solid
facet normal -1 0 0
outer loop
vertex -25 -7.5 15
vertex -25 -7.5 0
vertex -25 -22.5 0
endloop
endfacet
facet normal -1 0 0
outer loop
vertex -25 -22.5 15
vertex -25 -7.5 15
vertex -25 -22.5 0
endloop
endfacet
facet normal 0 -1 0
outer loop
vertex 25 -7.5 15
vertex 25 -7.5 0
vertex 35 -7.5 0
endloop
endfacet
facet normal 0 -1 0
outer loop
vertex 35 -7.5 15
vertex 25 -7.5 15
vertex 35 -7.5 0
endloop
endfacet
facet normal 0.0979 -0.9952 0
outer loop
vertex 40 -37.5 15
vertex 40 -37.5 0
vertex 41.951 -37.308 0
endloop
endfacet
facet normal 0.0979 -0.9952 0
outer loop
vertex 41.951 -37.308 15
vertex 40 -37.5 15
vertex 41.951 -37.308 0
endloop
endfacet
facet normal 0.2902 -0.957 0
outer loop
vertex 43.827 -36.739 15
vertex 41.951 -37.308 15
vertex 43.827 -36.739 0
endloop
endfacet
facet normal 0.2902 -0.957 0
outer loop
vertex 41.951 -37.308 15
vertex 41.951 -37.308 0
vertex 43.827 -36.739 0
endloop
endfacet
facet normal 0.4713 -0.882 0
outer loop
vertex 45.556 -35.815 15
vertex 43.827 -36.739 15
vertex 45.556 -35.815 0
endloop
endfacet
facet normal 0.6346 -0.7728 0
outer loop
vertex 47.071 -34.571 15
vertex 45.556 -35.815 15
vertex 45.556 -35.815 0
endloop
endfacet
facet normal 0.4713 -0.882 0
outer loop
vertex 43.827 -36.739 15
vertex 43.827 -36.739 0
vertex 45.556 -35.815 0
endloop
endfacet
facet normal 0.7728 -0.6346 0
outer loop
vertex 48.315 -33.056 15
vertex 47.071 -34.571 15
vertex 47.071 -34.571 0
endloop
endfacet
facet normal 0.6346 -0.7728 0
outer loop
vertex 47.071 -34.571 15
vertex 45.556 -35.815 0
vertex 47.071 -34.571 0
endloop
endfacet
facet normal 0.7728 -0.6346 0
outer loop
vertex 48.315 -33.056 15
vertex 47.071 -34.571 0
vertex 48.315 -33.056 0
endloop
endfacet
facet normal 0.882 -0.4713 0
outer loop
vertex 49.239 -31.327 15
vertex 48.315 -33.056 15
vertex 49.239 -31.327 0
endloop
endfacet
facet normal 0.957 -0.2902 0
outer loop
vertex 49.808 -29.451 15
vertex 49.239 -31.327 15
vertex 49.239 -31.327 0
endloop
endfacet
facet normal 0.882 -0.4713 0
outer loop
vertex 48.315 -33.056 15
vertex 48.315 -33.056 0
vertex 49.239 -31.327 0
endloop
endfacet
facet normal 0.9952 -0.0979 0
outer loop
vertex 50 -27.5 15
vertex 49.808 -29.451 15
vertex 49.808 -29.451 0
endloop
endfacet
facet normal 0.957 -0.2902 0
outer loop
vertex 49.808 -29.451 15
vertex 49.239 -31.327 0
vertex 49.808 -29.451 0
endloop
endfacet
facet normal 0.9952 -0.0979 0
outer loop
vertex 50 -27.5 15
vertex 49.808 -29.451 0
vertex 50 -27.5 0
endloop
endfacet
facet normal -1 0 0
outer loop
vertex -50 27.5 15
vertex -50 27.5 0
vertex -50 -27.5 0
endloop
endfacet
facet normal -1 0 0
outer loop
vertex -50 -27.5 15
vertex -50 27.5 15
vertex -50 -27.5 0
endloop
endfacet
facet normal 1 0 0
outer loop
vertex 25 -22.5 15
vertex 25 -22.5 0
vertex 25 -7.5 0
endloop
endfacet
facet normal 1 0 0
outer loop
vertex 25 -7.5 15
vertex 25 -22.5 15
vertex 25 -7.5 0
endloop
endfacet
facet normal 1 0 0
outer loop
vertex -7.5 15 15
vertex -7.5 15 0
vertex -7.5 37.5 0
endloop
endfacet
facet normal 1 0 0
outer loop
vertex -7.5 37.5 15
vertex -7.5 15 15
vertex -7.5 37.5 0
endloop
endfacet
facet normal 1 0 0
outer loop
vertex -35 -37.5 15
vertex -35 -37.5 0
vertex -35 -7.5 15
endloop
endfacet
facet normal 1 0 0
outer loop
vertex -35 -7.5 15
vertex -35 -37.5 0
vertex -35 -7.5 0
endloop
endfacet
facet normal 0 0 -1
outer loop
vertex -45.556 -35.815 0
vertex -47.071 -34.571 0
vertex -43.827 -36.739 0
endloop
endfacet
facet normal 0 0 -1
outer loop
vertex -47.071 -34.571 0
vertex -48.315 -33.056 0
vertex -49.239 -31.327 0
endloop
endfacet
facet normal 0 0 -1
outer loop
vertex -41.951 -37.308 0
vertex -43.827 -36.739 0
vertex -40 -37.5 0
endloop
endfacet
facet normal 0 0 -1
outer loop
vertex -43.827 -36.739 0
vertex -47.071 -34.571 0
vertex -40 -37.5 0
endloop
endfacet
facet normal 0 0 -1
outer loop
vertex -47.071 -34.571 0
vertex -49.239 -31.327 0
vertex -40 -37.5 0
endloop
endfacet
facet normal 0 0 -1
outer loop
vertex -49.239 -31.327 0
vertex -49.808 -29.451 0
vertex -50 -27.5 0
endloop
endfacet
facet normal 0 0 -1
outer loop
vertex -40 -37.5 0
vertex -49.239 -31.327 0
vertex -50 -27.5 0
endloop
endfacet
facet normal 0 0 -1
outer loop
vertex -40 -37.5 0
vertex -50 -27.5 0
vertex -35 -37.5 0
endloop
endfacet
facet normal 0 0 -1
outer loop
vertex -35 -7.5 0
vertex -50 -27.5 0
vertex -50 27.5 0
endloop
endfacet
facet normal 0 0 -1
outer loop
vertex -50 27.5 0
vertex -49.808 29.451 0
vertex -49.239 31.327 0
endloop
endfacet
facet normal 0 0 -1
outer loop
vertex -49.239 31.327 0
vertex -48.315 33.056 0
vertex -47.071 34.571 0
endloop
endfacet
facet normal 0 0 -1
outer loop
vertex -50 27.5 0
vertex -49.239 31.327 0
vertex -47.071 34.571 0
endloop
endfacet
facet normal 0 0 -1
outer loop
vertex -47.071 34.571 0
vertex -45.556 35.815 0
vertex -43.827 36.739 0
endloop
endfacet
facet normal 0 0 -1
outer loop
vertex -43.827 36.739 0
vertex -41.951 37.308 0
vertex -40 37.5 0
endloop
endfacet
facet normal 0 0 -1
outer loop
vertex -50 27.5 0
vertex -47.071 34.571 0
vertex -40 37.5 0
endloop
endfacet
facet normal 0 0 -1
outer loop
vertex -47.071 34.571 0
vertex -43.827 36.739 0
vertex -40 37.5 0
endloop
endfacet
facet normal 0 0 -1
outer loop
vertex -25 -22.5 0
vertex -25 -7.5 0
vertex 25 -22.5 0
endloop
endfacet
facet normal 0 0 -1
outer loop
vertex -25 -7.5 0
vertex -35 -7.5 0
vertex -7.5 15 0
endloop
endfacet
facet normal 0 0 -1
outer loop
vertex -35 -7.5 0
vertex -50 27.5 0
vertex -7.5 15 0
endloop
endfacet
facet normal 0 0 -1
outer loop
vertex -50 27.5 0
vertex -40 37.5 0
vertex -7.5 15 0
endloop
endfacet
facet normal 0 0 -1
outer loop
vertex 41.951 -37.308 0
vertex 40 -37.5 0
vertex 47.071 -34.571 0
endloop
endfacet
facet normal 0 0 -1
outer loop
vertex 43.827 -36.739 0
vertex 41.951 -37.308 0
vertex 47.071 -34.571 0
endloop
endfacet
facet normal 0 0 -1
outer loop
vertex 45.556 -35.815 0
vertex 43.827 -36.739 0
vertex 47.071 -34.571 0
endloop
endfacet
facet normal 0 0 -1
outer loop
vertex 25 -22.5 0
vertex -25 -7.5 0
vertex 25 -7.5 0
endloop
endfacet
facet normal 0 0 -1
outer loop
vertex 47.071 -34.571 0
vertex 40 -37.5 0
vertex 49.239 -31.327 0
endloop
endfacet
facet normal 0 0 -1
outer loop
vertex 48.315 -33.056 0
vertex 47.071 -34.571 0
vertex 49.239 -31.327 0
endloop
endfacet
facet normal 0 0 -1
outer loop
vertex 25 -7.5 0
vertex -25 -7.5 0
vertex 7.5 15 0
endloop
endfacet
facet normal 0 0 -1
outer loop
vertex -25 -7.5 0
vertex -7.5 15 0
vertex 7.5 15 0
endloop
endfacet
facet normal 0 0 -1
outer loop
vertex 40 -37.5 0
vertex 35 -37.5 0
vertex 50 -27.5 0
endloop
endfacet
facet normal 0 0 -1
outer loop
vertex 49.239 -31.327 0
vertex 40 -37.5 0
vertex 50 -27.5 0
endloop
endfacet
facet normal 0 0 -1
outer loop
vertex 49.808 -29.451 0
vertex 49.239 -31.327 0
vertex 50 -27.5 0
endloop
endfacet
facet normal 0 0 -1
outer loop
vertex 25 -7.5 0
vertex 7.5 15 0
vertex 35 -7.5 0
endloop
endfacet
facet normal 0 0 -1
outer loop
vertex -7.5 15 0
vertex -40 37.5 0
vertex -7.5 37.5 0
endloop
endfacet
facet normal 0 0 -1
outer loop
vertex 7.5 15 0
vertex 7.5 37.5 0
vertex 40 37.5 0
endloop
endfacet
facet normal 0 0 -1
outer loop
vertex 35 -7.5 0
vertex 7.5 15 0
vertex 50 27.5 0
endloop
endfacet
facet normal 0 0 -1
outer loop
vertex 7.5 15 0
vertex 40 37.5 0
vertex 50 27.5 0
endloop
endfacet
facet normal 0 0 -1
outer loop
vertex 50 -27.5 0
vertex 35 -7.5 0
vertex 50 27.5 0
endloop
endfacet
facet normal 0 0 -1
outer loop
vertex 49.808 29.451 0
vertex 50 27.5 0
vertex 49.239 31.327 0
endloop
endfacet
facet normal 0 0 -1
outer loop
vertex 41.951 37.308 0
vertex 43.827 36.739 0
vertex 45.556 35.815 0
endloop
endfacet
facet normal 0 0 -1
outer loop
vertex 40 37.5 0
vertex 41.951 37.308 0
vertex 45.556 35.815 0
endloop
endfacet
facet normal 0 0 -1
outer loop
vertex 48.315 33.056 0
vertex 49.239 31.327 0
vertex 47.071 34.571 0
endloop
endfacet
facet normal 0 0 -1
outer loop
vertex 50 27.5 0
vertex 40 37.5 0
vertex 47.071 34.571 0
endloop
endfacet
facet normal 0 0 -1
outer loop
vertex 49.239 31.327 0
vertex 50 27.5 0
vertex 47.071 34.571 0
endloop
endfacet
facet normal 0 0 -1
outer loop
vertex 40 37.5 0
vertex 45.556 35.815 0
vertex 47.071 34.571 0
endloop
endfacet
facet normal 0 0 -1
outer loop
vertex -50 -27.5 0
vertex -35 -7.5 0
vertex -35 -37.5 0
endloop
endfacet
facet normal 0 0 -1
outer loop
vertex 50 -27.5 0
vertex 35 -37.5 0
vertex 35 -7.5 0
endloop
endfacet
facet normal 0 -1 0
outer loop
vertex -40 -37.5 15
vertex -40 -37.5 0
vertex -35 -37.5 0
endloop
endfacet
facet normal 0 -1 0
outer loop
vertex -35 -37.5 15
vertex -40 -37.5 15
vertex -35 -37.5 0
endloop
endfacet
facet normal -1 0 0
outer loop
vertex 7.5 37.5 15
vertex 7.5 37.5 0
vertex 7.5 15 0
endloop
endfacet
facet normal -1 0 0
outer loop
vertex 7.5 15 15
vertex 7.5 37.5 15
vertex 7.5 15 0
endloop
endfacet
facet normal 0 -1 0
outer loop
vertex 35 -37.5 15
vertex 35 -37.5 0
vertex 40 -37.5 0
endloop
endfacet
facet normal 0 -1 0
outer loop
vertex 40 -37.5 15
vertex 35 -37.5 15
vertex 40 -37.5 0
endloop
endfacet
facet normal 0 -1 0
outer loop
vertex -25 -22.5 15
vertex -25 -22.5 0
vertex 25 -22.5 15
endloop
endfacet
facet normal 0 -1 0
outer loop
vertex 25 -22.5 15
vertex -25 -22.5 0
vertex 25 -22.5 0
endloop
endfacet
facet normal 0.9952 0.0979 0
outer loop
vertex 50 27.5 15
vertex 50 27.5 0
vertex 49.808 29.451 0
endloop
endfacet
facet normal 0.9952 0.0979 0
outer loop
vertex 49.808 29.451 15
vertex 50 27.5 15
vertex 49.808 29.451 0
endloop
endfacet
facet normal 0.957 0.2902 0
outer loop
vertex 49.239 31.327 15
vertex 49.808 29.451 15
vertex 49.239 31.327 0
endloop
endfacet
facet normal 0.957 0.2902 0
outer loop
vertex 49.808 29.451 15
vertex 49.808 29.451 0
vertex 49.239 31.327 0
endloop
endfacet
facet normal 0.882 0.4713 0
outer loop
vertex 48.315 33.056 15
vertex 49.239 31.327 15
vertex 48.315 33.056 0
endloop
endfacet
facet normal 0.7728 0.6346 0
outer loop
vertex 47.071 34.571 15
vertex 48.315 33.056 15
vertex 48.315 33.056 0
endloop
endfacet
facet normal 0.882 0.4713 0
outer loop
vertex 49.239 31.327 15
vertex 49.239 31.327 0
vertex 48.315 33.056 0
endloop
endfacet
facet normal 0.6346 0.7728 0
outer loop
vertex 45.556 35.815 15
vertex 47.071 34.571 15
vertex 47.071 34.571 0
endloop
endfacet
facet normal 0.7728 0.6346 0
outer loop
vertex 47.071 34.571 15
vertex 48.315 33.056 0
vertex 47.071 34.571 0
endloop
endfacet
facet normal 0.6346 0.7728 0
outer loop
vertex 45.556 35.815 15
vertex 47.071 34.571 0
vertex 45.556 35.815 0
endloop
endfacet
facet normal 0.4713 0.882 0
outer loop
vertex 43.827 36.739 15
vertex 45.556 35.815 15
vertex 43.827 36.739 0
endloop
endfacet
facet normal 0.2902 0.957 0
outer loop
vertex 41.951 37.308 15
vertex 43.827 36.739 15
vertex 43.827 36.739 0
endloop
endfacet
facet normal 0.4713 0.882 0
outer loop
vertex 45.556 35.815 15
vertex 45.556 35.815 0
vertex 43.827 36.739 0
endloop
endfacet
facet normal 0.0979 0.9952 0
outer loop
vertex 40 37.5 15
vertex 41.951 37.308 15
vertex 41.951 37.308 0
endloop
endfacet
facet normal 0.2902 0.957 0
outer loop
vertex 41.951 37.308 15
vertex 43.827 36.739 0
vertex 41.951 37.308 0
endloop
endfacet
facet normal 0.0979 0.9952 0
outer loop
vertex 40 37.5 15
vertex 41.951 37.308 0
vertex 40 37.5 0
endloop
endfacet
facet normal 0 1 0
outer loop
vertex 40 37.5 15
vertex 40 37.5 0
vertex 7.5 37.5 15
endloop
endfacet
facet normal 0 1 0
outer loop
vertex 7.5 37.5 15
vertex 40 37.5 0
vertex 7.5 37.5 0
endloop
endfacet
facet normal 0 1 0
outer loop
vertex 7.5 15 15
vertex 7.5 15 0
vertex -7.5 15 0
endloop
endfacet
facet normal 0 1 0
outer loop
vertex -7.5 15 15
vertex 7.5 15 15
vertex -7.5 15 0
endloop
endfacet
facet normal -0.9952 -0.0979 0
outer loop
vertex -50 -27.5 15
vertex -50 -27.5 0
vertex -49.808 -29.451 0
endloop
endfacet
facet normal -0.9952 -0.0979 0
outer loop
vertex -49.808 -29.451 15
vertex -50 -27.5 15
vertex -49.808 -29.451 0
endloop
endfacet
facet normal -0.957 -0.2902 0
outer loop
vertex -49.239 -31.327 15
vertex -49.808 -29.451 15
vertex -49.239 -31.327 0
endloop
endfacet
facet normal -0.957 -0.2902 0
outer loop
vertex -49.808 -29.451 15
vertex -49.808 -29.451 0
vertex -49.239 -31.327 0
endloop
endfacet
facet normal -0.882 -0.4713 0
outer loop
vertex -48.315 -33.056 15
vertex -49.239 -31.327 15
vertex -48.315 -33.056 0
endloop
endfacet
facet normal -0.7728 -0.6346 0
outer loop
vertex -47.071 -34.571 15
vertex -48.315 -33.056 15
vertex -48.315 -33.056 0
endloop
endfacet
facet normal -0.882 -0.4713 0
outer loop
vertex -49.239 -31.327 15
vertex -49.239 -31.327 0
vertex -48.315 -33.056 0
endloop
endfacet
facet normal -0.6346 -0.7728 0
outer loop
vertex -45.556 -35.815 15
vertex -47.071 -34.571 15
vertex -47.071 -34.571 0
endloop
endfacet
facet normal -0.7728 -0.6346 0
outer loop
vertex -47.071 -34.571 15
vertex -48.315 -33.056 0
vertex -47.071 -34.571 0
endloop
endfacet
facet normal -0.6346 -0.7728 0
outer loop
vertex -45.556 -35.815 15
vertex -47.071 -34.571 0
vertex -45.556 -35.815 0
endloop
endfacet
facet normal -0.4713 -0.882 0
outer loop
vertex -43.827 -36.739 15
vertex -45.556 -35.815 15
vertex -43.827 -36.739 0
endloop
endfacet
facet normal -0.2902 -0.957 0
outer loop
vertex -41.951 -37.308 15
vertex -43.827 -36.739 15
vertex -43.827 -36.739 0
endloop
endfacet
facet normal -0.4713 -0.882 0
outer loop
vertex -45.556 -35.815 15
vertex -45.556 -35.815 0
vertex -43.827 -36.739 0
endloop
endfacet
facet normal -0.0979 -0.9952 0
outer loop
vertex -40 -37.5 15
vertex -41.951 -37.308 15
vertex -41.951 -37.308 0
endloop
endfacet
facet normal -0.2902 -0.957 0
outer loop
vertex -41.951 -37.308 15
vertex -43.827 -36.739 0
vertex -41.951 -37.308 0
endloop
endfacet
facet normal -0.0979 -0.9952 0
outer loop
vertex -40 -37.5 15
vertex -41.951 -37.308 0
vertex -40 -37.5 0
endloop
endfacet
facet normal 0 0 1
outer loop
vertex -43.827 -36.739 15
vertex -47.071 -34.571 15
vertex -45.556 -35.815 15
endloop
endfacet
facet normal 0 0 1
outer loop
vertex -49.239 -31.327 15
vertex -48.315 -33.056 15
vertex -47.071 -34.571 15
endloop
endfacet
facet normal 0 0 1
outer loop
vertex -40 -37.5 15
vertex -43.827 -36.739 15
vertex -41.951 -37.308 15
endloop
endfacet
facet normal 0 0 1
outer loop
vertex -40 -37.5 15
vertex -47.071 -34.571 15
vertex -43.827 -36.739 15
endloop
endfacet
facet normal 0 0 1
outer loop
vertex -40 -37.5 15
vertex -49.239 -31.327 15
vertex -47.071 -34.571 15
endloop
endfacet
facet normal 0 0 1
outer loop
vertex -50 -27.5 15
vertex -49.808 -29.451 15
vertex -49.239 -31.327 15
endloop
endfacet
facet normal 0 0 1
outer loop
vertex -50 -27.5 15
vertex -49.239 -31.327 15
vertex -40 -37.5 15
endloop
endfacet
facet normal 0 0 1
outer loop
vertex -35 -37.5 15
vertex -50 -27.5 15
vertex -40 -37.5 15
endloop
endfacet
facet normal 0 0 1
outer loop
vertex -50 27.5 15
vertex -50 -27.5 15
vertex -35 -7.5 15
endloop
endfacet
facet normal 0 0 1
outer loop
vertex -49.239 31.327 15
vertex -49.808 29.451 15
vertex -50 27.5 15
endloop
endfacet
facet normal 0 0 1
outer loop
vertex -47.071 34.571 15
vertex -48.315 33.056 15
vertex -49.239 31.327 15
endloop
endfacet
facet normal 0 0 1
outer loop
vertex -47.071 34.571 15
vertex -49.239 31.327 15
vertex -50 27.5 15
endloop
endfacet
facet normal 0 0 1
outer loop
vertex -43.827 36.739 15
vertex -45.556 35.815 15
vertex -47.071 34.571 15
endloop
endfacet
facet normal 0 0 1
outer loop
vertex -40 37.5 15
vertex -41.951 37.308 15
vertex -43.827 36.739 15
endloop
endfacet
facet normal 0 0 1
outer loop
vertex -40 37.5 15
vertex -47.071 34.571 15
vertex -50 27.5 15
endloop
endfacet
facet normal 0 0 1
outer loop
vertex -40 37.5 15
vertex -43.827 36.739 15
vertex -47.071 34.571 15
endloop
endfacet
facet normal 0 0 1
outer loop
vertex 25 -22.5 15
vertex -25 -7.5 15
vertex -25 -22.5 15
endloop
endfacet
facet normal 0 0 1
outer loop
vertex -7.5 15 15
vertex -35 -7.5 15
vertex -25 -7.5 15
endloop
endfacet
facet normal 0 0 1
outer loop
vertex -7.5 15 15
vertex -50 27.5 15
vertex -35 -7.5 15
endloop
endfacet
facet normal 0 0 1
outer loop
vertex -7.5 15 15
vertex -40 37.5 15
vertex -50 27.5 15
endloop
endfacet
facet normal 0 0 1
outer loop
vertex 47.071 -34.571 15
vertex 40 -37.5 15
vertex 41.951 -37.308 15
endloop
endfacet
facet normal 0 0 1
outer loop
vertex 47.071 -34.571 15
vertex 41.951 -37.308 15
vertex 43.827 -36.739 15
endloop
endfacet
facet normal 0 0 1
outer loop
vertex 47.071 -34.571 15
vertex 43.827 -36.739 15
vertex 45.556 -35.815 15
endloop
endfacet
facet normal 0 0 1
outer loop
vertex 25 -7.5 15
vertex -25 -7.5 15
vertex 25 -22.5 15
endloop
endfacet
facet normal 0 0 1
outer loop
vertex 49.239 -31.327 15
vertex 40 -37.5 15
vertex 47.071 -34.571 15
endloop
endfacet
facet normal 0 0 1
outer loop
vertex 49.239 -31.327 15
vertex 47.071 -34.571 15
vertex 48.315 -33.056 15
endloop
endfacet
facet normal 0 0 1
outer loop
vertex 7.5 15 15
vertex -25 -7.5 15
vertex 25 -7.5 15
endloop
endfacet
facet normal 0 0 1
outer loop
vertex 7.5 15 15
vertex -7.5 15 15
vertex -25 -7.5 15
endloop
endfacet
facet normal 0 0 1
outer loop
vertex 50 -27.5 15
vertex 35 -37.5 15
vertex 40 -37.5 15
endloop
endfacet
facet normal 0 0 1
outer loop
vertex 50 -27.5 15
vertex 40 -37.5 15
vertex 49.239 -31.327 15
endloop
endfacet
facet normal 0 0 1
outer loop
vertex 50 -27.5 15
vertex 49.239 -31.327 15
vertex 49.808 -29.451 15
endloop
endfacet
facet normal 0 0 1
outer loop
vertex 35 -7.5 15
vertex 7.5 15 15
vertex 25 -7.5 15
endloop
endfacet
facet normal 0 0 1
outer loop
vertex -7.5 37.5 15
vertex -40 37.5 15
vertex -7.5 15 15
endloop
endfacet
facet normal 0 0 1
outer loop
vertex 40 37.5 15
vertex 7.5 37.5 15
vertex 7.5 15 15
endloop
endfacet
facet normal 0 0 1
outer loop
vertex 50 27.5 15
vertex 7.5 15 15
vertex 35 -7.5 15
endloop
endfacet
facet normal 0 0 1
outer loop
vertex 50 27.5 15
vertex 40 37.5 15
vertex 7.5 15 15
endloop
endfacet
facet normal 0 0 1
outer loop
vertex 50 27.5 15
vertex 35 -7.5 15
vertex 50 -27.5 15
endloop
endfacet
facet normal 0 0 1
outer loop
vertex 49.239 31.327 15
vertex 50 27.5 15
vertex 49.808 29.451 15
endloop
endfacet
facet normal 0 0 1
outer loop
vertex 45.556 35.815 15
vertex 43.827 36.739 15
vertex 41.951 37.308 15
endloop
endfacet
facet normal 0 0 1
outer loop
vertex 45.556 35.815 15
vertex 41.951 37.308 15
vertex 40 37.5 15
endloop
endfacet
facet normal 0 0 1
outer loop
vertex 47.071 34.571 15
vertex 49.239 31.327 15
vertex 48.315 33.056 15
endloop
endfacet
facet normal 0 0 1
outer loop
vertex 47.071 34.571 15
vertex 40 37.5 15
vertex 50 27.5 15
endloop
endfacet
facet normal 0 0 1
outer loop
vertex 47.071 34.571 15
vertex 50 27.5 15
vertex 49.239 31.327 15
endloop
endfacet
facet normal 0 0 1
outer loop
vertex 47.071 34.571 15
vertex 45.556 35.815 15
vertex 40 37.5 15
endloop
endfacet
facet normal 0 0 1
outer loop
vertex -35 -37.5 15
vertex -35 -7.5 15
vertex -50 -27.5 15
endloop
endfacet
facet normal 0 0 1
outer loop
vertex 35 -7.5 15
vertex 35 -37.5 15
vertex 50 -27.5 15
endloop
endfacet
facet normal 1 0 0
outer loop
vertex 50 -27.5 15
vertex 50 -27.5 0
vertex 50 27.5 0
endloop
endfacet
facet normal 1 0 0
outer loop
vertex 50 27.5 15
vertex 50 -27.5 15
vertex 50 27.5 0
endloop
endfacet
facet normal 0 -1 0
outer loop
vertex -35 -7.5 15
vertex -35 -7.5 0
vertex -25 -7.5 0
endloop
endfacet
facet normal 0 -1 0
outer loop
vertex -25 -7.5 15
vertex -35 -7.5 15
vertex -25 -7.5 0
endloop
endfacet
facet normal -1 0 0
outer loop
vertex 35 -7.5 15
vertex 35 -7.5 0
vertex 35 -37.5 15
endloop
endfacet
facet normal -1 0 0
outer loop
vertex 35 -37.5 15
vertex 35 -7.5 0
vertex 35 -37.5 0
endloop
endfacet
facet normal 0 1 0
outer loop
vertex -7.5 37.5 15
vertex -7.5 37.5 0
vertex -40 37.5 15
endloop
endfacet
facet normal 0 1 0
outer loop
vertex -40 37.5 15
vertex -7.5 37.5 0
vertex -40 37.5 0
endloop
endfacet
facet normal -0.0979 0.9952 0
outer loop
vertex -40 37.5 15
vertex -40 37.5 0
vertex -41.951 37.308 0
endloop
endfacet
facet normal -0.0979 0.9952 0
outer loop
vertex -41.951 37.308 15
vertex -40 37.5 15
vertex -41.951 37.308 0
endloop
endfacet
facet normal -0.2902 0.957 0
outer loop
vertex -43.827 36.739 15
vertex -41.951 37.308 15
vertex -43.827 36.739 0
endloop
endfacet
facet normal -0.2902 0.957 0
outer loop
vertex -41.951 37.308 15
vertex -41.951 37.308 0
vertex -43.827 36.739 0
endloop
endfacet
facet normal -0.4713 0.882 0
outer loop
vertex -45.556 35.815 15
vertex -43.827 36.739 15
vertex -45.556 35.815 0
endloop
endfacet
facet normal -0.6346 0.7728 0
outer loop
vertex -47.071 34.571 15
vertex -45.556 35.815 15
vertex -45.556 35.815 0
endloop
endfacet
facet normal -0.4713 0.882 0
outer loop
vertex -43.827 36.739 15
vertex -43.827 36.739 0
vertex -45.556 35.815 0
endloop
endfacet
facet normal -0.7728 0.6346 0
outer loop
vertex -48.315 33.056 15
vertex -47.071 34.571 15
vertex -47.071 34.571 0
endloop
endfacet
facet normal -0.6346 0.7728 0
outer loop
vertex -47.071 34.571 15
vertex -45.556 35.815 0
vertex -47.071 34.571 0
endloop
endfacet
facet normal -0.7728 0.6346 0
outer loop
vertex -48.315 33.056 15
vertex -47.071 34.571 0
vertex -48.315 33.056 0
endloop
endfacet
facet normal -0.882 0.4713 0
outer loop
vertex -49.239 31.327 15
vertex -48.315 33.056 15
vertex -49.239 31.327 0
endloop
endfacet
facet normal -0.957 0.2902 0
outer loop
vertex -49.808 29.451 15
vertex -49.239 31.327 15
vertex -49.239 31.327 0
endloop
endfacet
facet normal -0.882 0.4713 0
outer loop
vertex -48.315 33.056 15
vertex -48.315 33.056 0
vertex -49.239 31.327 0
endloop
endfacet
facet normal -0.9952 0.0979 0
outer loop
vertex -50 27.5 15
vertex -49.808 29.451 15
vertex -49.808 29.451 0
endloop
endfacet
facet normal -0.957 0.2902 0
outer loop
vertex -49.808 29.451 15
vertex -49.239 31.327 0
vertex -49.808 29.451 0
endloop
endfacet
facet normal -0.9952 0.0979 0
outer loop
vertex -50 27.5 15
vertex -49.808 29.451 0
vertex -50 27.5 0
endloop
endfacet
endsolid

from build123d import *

# Parameters (mm, degrees)
BOSS_EXTRU_1_DEPTH = 15


with BuildPart() as part:
    # Esquisse1 → Boss.-Extru.1 (new body)
    with BuildSketch(Plane.XY):
        with BuildLine():
            ThreePointArc((-50, -27.5), (-47.071067812, -34.571067812), (-40, -37.5))
            Line((-40, -37.5), (-35, -37.5))
            Line((-35, -37.5), (-35, -22.5))
            Line((-35, -22.5), (-35, -7.5))
            Line((-35, -7.5), (-25, -7.5))
            Line((-25, -7.5), (-25, -22.5))
            Line((-25, -22.5), (25, -22.5))
            Line((25, -22.5), (25, -7.5))
            Line((25, -7.5), (35, -7.5))
            Line((35, -7.5), (35, -22.5))
            Line((35, -22.5), (35, -37.5))
            Line((35, -37.5), (40, -37.5))
            ThreePointArc((40, -37.5), (47.071067812, -34.571067812), (50, -27.5))
            Line((50, -27.5), (50, 27.5))
            ThreePointArc((50, 27.5), (47.071067812, 34.571067812), (40, 37.5))
            Line((40, 37.5), (7.5, 37.5))
            Line((7.5, 37.5), (7.5, 15))
            Line((7.5, 15), (-7.5, 15))
            Line((-7.5, 15), (-7.5, 37.5))
            Line((-7.5, 37.5), (-40, 37.5))
            ThreePointArc((-40, 37.5), (-47.071067812, 34.571067812), (-50, 27.5))
            Line((-50, 27.5), (-50, -27.5))
        make_face()
    extrude(amount=BOSS_EXTRU_1_DEPTH)


solid = part.part
